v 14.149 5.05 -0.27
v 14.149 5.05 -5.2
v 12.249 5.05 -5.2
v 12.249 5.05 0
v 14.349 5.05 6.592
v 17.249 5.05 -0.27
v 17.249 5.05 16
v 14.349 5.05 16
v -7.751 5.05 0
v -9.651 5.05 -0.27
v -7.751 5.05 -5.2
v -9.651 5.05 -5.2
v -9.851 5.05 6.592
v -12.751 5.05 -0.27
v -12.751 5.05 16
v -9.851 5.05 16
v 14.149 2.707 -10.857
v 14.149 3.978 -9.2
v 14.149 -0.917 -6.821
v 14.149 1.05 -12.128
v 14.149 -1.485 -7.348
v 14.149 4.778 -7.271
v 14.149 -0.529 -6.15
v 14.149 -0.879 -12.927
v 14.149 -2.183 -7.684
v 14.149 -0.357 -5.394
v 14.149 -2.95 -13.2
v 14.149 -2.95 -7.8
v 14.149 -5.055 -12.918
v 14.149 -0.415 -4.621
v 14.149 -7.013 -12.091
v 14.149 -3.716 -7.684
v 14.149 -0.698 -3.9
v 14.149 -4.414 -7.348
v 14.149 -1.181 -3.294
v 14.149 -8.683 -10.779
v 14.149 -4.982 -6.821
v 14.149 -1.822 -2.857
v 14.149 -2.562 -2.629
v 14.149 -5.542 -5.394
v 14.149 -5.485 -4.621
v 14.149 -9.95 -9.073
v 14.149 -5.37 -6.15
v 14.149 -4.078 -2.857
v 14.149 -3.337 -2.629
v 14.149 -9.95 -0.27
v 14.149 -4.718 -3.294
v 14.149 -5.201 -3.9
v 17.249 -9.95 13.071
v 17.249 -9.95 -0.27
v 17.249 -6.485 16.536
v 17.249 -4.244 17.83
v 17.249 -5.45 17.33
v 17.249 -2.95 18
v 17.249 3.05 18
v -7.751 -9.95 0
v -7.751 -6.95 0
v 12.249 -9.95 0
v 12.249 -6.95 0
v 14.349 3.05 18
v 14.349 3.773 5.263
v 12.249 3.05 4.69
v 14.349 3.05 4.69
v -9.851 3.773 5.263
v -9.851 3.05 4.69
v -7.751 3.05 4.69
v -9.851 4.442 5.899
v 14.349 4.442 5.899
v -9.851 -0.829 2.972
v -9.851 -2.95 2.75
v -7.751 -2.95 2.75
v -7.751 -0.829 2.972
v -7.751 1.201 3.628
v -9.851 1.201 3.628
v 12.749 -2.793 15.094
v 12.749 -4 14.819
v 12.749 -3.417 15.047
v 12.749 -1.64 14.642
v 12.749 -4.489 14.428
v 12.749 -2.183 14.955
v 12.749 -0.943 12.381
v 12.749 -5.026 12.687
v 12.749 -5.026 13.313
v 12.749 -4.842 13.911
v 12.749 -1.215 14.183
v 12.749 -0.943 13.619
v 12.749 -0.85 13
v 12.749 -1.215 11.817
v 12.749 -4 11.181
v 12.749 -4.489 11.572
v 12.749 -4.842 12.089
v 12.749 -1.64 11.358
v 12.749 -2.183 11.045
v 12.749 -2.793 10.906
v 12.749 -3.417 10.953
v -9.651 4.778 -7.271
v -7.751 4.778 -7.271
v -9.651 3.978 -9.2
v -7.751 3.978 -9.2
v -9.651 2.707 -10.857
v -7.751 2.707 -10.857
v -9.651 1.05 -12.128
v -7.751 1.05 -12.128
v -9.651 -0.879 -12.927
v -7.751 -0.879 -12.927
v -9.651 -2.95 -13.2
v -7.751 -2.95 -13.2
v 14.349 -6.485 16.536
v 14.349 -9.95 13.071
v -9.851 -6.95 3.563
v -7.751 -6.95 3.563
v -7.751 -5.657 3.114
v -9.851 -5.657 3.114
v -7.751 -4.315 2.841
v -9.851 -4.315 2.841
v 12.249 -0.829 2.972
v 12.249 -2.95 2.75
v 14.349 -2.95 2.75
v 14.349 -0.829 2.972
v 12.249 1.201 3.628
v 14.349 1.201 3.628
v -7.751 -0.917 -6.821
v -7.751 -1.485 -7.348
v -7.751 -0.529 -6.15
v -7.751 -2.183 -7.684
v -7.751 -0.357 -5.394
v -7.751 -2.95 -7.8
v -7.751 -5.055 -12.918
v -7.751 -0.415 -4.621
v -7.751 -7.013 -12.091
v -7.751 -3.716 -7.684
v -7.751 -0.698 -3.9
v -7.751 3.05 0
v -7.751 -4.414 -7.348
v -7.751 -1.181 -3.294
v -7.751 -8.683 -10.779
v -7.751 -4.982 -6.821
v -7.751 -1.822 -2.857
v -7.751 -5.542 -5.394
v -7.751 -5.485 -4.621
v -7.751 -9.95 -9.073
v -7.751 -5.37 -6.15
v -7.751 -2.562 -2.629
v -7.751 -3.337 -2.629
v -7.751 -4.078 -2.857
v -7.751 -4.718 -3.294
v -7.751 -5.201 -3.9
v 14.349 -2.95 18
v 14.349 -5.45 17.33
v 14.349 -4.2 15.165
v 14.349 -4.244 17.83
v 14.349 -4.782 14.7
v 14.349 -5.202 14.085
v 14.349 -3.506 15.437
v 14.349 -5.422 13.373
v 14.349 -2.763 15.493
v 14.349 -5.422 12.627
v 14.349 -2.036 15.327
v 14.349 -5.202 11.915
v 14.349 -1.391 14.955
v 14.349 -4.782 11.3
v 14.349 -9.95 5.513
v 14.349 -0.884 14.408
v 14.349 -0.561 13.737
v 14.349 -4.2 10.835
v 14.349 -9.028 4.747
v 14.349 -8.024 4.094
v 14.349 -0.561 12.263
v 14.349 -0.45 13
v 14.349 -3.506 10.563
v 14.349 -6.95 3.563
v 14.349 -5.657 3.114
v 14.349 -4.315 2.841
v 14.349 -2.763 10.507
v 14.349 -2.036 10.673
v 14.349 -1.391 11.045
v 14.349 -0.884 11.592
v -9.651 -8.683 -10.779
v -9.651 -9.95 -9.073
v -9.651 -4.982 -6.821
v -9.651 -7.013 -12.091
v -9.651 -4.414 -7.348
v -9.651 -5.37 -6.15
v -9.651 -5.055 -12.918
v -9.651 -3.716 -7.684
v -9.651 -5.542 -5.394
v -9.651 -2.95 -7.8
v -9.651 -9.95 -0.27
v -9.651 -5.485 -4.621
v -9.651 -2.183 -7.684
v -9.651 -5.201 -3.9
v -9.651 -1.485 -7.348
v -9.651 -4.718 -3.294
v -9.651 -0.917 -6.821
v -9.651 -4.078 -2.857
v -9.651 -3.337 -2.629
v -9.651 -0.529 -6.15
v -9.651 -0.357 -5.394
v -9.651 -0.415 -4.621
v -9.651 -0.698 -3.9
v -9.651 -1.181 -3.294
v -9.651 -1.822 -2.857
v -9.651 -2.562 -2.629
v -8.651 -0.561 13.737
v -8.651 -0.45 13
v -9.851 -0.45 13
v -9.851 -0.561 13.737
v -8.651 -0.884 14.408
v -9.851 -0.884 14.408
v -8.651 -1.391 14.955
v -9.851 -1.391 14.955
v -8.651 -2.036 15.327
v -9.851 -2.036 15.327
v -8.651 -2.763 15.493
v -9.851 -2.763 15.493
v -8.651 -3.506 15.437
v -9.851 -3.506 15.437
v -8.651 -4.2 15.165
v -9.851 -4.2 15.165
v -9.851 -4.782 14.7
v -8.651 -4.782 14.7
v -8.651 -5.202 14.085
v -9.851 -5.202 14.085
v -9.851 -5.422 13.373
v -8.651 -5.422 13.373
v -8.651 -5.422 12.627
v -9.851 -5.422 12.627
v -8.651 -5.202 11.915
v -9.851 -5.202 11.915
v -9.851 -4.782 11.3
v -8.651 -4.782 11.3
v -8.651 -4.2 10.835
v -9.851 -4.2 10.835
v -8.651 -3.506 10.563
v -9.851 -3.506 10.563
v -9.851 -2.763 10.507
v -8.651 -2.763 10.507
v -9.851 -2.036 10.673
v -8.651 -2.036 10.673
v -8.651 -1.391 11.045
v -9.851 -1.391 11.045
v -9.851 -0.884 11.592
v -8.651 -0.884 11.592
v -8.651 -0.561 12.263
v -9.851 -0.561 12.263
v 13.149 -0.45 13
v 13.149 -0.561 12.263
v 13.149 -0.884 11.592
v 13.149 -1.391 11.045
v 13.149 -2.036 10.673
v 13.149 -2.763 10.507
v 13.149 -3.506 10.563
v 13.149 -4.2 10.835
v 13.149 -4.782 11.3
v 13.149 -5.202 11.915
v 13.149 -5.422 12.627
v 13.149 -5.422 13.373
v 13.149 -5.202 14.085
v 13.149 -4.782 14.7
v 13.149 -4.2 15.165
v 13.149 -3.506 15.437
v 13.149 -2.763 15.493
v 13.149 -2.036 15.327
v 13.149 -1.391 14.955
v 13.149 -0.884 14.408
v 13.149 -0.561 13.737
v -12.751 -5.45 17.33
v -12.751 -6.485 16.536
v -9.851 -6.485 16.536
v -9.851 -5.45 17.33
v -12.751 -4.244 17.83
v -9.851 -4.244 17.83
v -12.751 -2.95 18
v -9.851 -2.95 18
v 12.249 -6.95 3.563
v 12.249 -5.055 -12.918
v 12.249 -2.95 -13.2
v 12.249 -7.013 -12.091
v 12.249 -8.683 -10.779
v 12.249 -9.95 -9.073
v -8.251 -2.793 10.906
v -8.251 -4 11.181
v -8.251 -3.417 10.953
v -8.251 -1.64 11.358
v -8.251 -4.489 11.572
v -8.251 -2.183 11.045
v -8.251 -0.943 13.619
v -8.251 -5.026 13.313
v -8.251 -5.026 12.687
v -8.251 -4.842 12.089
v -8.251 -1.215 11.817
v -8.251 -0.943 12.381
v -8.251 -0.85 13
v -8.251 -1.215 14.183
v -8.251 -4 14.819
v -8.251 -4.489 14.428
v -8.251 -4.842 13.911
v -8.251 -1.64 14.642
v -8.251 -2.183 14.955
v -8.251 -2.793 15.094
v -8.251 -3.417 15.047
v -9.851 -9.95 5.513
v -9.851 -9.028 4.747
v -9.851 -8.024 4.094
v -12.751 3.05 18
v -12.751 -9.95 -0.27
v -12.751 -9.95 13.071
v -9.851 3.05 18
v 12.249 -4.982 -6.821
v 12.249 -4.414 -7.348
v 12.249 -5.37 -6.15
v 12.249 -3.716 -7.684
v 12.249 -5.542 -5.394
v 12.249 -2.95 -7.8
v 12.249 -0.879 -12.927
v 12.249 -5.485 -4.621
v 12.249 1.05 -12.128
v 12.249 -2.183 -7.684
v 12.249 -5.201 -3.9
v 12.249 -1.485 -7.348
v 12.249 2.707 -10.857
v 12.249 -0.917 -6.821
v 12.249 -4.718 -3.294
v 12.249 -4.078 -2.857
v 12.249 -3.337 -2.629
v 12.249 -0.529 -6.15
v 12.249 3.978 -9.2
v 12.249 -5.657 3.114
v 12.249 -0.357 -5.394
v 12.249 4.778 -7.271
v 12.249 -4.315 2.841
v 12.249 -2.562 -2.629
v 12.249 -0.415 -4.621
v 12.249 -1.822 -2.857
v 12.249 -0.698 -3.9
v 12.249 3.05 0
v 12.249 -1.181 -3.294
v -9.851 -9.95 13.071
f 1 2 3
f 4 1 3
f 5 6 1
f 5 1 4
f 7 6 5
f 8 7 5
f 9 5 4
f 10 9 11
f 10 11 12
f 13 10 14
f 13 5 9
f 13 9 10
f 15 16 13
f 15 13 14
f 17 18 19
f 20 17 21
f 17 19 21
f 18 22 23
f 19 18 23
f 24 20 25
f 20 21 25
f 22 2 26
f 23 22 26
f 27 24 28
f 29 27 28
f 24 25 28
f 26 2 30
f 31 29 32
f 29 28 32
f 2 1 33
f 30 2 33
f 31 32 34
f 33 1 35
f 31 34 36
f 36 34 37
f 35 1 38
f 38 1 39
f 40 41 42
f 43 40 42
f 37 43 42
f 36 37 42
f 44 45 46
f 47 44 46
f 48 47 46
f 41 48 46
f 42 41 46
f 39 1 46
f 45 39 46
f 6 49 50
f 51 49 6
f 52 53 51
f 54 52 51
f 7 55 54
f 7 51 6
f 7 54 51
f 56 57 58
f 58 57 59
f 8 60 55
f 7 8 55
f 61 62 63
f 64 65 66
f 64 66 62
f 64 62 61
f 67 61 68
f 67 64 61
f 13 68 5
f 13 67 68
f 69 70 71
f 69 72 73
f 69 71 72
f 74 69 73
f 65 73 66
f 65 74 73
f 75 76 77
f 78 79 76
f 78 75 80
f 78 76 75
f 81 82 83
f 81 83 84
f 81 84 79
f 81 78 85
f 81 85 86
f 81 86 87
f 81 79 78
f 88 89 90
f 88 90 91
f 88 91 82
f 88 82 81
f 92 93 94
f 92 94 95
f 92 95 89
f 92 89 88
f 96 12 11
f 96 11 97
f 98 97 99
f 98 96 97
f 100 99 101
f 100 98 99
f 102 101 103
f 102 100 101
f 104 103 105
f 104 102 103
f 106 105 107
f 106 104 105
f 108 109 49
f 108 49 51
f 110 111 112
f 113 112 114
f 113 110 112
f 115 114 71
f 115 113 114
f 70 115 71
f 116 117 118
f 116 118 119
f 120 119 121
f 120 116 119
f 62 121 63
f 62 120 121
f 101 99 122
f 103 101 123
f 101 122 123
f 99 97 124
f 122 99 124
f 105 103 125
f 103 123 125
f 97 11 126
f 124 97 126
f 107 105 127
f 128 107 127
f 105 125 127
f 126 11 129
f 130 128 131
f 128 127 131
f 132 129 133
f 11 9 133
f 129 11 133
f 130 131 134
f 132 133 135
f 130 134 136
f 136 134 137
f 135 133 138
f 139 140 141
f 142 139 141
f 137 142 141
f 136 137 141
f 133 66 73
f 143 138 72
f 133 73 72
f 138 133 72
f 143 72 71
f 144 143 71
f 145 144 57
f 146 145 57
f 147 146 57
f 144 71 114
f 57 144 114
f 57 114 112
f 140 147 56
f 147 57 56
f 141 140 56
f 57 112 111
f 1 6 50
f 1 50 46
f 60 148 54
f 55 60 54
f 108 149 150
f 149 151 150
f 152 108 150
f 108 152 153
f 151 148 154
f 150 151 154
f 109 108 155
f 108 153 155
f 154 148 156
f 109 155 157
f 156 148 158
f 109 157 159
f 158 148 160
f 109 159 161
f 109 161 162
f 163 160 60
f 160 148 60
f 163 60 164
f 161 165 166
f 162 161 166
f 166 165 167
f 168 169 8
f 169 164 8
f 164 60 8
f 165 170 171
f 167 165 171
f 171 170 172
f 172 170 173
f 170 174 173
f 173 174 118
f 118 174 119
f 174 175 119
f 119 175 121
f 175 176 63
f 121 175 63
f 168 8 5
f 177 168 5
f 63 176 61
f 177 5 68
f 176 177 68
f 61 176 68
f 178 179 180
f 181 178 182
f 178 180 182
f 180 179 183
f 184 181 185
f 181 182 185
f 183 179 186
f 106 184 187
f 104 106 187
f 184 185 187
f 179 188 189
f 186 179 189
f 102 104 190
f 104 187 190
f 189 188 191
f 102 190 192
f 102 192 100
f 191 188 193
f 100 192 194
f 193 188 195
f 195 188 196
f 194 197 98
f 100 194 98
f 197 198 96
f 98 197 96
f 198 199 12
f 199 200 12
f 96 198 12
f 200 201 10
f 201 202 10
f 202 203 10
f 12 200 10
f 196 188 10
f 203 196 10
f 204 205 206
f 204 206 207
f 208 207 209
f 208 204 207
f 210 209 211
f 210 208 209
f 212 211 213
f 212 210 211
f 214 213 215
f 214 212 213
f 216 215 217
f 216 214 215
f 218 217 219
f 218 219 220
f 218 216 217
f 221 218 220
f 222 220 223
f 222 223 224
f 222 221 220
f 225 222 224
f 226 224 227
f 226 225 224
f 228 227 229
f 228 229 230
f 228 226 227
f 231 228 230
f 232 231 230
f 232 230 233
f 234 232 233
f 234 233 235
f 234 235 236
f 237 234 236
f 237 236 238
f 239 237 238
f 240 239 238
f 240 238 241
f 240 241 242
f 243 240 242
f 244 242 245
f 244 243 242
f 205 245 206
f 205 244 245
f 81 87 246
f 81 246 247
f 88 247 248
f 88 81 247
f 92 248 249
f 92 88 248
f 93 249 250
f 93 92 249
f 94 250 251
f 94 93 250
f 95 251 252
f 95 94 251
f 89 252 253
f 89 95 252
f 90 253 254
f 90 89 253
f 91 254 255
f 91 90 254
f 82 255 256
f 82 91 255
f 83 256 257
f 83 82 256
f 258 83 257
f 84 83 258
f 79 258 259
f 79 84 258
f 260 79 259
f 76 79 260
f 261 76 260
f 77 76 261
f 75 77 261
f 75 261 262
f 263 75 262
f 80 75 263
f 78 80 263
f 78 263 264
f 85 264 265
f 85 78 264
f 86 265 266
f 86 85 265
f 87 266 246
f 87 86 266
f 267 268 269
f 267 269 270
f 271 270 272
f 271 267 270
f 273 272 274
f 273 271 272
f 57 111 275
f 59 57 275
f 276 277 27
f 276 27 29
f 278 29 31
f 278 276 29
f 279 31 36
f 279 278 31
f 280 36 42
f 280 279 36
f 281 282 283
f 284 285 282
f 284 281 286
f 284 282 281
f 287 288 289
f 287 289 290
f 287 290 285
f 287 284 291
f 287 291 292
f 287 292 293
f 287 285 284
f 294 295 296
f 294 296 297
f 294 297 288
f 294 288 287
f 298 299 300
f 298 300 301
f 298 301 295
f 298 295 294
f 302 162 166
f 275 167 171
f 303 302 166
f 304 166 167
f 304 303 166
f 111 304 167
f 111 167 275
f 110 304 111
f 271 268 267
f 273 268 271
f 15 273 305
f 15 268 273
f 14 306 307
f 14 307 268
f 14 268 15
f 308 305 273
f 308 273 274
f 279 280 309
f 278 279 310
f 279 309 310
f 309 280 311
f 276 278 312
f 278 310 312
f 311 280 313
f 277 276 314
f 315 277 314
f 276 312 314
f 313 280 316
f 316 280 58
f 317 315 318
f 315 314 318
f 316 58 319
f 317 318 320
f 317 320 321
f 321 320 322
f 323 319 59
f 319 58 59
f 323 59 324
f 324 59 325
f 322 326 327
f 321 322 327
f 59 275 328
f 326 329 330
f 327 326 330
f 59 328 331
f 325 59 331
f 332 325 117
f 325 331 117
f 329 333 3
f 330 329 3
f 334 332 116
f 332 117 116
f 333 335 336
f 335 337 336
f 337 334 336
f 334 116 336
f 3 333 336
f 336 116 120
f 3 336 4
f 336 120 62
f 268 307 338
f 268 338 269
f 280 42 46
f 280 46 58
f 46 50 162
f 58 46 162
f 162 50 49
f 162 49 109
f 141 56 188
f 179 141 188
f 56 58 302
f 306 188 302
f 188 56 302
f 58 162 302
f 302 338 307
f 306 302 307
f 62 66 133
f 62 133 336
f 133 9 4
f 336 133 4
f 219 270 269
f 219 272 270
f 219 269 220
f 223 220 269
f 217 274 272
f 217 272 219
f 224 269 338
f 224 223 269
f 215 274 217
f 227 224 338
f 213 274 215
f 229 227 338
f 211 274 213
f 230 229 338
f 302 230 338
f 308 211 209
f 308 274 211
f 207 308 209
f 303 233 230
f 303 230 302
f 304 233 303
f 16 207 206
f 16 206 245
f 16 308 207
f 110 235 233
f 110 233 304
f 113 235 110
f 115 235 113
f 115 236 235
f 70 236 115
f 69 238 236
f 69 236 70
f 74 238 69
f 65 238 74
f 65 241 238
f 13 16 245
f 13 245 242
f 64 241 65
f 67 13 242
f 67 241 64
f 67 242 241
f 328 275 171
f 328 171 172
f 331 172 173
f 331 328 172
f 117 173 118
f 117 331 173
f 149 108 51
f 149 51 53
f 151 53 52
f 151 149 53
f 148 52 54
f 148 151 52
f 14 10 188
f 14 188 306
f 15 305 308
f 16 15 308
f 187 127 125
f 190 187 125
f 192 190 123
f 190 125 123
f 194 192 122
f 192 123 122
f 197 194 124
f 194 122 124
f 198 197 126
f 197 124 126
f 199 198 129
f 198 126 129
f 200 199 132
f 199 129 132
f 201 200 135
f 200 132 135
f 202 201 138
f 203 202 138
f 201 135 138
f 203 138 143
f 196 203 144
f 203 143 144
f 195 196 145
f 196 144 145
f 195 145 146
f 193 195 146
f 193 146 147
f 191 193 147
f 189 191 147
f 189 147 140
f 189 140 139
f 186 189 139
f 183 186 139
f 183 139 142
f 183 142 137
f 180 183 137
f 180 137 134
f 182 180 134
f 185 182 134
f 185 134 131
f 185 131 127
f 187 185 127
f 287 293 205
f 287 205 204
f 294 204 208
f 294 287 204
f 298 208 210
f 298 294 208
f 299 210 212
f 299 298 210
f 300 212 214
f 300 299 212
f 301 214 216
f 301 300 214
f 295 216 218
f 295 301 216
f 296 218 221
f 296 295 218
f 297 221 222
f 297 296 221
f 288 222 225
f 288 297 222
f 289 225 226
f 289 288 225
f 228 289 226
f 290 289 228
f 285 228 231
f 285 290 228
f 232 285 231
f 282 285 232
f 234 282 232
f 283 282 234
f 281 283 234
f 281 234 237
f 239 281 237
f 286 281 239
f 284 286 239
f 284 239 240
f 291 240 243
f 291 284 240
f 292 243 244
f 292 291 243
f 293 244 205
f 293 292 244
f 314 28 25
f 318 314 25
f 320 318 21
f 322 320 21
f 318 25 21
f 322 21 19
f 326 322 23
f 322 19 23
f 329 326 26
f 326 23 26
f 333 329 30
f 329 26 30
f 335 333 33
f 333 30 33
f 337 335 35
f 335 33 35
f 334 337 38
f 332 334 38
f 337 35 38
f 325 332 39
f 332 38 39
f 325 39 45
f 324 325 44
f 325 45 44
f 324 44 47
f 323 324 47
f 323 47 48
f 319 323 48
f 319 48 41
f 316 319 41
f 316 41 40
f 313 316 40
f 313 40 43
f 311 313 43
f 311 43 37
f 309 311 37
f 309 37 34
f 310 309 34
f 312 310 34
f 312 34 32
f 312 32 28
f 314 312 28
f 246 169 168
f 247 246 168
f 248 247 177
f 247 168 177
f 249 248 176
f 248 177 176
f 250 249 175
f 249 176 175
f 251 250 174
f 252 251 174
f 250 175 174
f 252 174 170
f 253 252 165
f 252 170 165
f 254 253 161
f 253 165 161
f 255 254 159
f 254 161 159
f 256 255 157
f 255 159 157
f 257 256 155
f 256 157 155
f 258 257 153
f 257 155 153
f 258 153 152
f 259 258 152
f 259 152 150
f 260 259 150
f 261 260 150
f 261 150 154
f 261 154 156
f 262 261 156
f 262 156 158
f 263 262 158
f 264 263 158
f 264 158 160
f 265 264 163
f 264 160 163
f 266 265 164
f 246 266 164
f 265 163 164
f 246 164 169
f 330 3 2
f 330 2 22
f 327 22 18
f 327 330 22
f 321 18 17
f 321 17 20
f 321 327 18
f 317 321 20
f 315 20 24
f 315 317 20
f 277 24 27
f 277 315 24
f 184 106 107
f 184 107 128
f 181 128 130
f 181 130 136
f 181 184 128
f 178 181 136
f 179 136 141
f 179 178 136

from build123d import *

# Parameters (mm, degrees)
SKETCH_1_W               = 30
SKETCH_1_H               = 15
EXTRUDE_1_DEPTH          = 18
CUT_EXTRUDE_1_REACH      = 28.843
SKETCH_2_W               = 20
SKETCH_2_H               = 10
CUT_EXTRUDE_2_REACH      = 29.668
SKETCH_3_W               = 20
SKETCH_3_H               = 12
CUT_EXTRUDE_5_DEPTH      = 22.1
CUT_EXTRUDE_5_DEPTH_BACK = 2.1
SKETCH_4_W               = 5
SKETCH_4_H               = 6
SKETCH_5_R               = 2.5
EXTRUDE_2_DEPTH          = 1.6
EXTRUDE_START            = 1.6
SKETCH_6_R               = 2.5
EXTRUDE_3_DEPTH          = 1.6
CHAMFER_1_SIZE           = 0.4
CUT_EXTRUDE_6_DEPTH      = 35.020684023
CUT_EXTRUDE_6_DEPTH_BACK = 35.020684023
CUT_EXTRUDE_7_DEPTH      = 35.020684023
CUT_EXTRUDE_7_DEPTH_BACK = 35.020684023
EXTRUDE_4_DEPTH          = 20
SKETCH_10_R              = 2.6
CUT_EXTRUDE_8_DEPTH      = 35.965796737
CUT_EXTRUDE_9_DEPTH      = 35.965796737
CUT_EXTRUDE_9_DEPTH_BACK = 35.965796737
SKETCH_12_W              = 1.696031958
SKETCH_12_H              = 15
CHAMFER_2_SIZE           = 2
SKETCH_17_W              = 3.1
SKETCH_17_H              = 15
EXTRUDE_8_DEPTH          = 0.27


with BuildPart() as part:
    # 草圖1 → 填料-伸長1 (new body)
    with BuildSketch(Plane.XY):
        with Locations((2.249045701, -2.44972067)):
            Rectangle(SKETCH_1_W, SKETCH_1_H)
    extrude(amount=EXTRUDE_1_DEPTH)

    # 草圖2 → 除料-伸長1 (cut, up to next)
    with BuildSketch(Plane.XY.offset(18), mode=Mode.PRIVATE) as cut_extrude_1_sk1:
        with Locations((2.249045701, -1.94972067)):
            Rectangle(SKETCH_2_W, SKETCH_2_H)
    cut_extrude_1_tool1 = extrude(cut_extrude_1_sk1.sketch, amount=-CUT_EXTRUDE_1_REACH, mode=Mode.PRIVATE) & part.part
    add(cut_extrude_1_tool1.solids().sort_by_distance((2.249046, -1.949721, 18))[0], mode=Mode.SUBTRACT)

    # 草圖3 → 除料-伸長2 (cut, up to next)
    with BuildSketch(Plane(origin=(0, -6.94972067, 0), x_dir=(1, 0, 0), z_dir=(0, 1, 0)), mode=Mode.PRIVATE) as cut_extrude_2_sk1:
        with Locations((2.249045701, -12)):
            Rectangle(SKETCH_3_W, SKETCH_3_H)
    cut_extrude_2_tool1 = extrude(cut_extrude_2_sk1.sketch, amount=-CUT_EXTRUDE_2_REACH, mode=Mode.PRIVATE) & part.part
    add(cut_extrude_2_tool1.solids().sort_by_distance((2.249046, -6.949721, 12))[0], mode=Mode.SUBTRACT)

    # 草圖4 → 除料-伸長5 (cut, two sides: drawn at the far end of the back side and taken through both)
    with BuildSketch(Plane(origin=(-7.750954299, 0, 0), x_dir=(0, 0, -1), z_dir=(1, 0, 0)).offset(-CUT_EXTRUDE_5_DEPTH_BACK)):
        with Locations((-15.5, 0.05027933)):
            Rectangle(SKETCH_4_W, SKETCH_4_H)
        with BuildLine():
            Line((-13, 3.05027933), (-13, -2.94972067))
            Line((-13, -2.94972067), (-18, -2.94972067))
            Line((-18, -2.94972067), (-18, -9.94972067))
            Line((-18, -9.94972067), (-6, -9.94972067))
            Line((-6, -9.94972067), (-6, -6.94972067))
            Line((-6, -6.94972067), (-3.562706956, -6.94972067))
            ThreePointArc((-3.562706956, -6.94972067), (-2.955231369, -4.990584005), (-2.75, -2.94972067))
            ThreePointArc((-2.75, -2.94972067), (-3.246950555, 0.203139384), (-4.689614931, 3.05027933))
            Line((-4.689614931, 3.05027933), (-13, 3.05027933))
        make_face()
        with BuildLine():
            ThreePointArc((-18, 5.998044414), (-15.583399687, 6.969379392), (-13, 7.30027933))
            Line((-13, 7.30027933), (-13, 7.89449882))
            Line((-13, 7.89449882), (-18, 7.89449882))
            Line((-18, 7.89449882), (-18, 5.998044414))
        make_face()
        with BuildLine():
            Line((-13, 7.30027933), (-13, 3.05027933))
            Line((-13, 3.05027933), (-4.689614931, 3.05027933))
            ThreePointArc((-4.689614931, 3.05027933), (-8.332961324, 6.176135454), (-13, 7.30027933))
        make_face()
        with BuildLine():
            Line((-18, 3.05027933), (-13, 3.05027933))
            Line((-13, 3.05027933), (-13, 7.30027933))
            ThreePointArc((-13, 7.30027933), (-15.583399687, 6.969379392), (-18, 5.998044414))
            Line((-18, 5.998044414), (-18, 3.05027933))
        make_face()
        with BuildLine():
            Line((-18, -9.94972067), (-18, -2.94972067))
            Line((-18, -2.94972067), (-18, 3.05027933))
            Line((-18, 3.05027933), (-18, 5.998044414))
            ThreePointArc((-18, 5.998044414), (-19.843504041, -10.580510436), (-3.562706956, -6.94972067))
            Line((-3.562706956, -6.94972067), (-6, -6.94972067))
            Line((-6, -6.94972067), (-6, -9.94972067))
            Line((-6, -9.94972067), (-18, -9.94972067))
        make_face()
    extrude(amount=CUT_EXTRUDE_5_DEPTH + CUT_EXTRUDE_5_DEPTH_BACK, mode=Mode.SUBTRACT)

    # 草圖5 → 填料-伸長2 (add)
    with BuildSketch(Plane.ZY.offset(-14.349045701)):
        with Locations(Location((13, -2.94972067, 0), (0, 0, 90))):
            Circle(SKETCH_5_R)
    extrude(amount=EXTRUDE_2_DEPTH)

    # 草圖6 → 填料-伸長3 (add)
    with BuildSketch(Plane(origin=(-9.850954299, 0, 0), x_dir=(0, 0, -1), z_dir=(1, 0, 0)).offset(EXTRUDE_START)):
        with Locations(Location((-13, -2.94972067, 0), (0, 0, 90))):
            Circle(SKETCH_6_R)
    extrude(amount=-EXTRUDE_3_DEPTH)

    # 導角1
    chamfer_1_edges = [part.edges().sort_by_distance(p)[0] for p in [
        (12.749045701, -5.44972067, 13),
        (-8.250954299, -5.44972067, 13),
    ]]
    chamfer(chamfer_1_edges, length=CHAMFER_1_SIZE)

    # 草圖7 → 除料-伸長6 (cut, two sides: drawn at the far end of the back side and taken through both)
    with BuildSketch(Plane(origin=(-9.850954299, 0, 0), x_dir=(0, 0, -1), z_dir=(1, 0, 0)).offset(-CUT_EXTRUDE_6_DEPTH_BACK)):
        Polygon((-18, -9.94972067), (-13.071067812, -9.94972067), (-18, -5.020788482), align=None)
    extrude(amount=CUT_EXTRUDE_6_DEPTH + CUT_EXTRUDE_6_DEPTH_BACK, mode=Mode.SUBTRACT)

    # 草圖8 → 除料-伸長7 (cut, two sides: drawn at the far end of the back side and taken through both)
    with BuildSketch(Plane(origin=(-9.850954299, 0, 0), x_dir=(0, 0, -1), z_dir=(1, 0, 0)).offset(-CUT_EXTRUDE_7_DEPTH_BACK)):
        with BuildLine():
            Line((-18, -2.94972067), (-18, -5.020788482))
            Line((-18, -5.020788482), (-16.535533871, -6.485254612))
            ThreePointArc((-16.535533871, -6.485254612), (-17.619397653, -4.863137855), (-18, -2.94972067))
        make_face()
    extrude(amount=CUT_EXTRUDE_7_DEPTH + CUT_EXTRUDE_7_DEPTH_BACK, mode=Mode.SUBTRACT)

    # 草圖9 → 填料-伸長4 (add)
    with BuildSketch(Plane(origin=(0, 0, 0), x_dir=(-1, 0, 0), z_dir=(0, 0, -1))):
        Polygon((9.650954299, 5.05027933), (7.750954299, 5.05027933), (7.750954299, 3.05027933), (7.750954299, -6.94972067), (7.750954299, -9.94972067), (9.650954299, -9.94972067), align=None)
        Polygon((-12.249045701, 3.05027933), (-12.249045701, 5.05027933), (-14.149045701, 5.05027933), (-14.149045701, -9.94972067), (-12.249045701, -9.94972067), (-12.249045701, -6.94972067), align=None)
    extrude(amount=EXTRUDE_4_DEPTH)

    # 草圖10 → 除料-伸長8 (cut, through all)
    with BuildSketch(Plane(origin=(14.149045701, 0, 0), x_dir=(0, 0, -1), z_dir=(1, 0, 0))):
        with Locations((5.2, -2.94972067)):
            Circle(SKETCH_10_R)
    extrude(amount=-CUT_EXTRUDE_8_DEPTH, mode=Mode.SUBTRACT)

    # 草圖12 → 除料-伸長9 (cut, two sides: drawn at the far end of the back side and taken through both)
    with BuildSketch(Plane(origin=(14.149045701, 0, 0), x_dir=(0, 0, -1), z_dir=(1, 0, 0)).offset(-CUT_EXTRUDE_9_DEPTH_BACK)):
        with BuildLine():
            Line((18.303968042, 5.05027933), (5.2, 5.05027933))
            ThreePointArc((5.2, 5.05027933), (10.856854249, 2.707133579), (13.2, -2.94972067))
            ThreePointArc((13.2, -2.94972067), (12.091439137, -7.012732683), (9.072983346, -9.94972067))
            Line((9.072983346, -9.94972067), (18.303968042, -9.94972067))
            Line((18.303968042, -9.94972067), (18.303968042, 5.05027933))
        make_face()
        with Locations((19.151984021, -2.44972067)):
            Rectangle(SKETCH_12_W, SKETCH_12_H)
    extrude(amount=CUT_EXTRUDE_9_DEPTH + CUT_EXTRUDE_9_DEPTH_BACK, mode=Mode.SUBTRACT)

    # 導角2
    chamfer_2_edges = [part.edges().sort_by_distance(p)[0] for p in [
        (15.799045701, 5.05027933, 18),
        (-11.300954299, 5.05027933, 18),
    ]]
    chamfer(chamfer_2_edges, length=CHAMFER_2_SIZE)

    # 草圖17 → 填料-伸長8 (add)
    with BuildSketch(Plane(origin=(0, 0, 0), x_dir=(-1, 0, 0), z_dir=(0, 0, -1))):
        with Locations((-15.699045701, -2.44972067)):
            Rectangle(SKETCH_17_W, SKETCH_17_H)
        with Locations((11.200954299, -2.44972067)):
            Rectangle(SKETCH_17_W, SKETCH_17_H)
    extrude(amount=EXTRUDE_8_DEPTH)


solid = part.part
